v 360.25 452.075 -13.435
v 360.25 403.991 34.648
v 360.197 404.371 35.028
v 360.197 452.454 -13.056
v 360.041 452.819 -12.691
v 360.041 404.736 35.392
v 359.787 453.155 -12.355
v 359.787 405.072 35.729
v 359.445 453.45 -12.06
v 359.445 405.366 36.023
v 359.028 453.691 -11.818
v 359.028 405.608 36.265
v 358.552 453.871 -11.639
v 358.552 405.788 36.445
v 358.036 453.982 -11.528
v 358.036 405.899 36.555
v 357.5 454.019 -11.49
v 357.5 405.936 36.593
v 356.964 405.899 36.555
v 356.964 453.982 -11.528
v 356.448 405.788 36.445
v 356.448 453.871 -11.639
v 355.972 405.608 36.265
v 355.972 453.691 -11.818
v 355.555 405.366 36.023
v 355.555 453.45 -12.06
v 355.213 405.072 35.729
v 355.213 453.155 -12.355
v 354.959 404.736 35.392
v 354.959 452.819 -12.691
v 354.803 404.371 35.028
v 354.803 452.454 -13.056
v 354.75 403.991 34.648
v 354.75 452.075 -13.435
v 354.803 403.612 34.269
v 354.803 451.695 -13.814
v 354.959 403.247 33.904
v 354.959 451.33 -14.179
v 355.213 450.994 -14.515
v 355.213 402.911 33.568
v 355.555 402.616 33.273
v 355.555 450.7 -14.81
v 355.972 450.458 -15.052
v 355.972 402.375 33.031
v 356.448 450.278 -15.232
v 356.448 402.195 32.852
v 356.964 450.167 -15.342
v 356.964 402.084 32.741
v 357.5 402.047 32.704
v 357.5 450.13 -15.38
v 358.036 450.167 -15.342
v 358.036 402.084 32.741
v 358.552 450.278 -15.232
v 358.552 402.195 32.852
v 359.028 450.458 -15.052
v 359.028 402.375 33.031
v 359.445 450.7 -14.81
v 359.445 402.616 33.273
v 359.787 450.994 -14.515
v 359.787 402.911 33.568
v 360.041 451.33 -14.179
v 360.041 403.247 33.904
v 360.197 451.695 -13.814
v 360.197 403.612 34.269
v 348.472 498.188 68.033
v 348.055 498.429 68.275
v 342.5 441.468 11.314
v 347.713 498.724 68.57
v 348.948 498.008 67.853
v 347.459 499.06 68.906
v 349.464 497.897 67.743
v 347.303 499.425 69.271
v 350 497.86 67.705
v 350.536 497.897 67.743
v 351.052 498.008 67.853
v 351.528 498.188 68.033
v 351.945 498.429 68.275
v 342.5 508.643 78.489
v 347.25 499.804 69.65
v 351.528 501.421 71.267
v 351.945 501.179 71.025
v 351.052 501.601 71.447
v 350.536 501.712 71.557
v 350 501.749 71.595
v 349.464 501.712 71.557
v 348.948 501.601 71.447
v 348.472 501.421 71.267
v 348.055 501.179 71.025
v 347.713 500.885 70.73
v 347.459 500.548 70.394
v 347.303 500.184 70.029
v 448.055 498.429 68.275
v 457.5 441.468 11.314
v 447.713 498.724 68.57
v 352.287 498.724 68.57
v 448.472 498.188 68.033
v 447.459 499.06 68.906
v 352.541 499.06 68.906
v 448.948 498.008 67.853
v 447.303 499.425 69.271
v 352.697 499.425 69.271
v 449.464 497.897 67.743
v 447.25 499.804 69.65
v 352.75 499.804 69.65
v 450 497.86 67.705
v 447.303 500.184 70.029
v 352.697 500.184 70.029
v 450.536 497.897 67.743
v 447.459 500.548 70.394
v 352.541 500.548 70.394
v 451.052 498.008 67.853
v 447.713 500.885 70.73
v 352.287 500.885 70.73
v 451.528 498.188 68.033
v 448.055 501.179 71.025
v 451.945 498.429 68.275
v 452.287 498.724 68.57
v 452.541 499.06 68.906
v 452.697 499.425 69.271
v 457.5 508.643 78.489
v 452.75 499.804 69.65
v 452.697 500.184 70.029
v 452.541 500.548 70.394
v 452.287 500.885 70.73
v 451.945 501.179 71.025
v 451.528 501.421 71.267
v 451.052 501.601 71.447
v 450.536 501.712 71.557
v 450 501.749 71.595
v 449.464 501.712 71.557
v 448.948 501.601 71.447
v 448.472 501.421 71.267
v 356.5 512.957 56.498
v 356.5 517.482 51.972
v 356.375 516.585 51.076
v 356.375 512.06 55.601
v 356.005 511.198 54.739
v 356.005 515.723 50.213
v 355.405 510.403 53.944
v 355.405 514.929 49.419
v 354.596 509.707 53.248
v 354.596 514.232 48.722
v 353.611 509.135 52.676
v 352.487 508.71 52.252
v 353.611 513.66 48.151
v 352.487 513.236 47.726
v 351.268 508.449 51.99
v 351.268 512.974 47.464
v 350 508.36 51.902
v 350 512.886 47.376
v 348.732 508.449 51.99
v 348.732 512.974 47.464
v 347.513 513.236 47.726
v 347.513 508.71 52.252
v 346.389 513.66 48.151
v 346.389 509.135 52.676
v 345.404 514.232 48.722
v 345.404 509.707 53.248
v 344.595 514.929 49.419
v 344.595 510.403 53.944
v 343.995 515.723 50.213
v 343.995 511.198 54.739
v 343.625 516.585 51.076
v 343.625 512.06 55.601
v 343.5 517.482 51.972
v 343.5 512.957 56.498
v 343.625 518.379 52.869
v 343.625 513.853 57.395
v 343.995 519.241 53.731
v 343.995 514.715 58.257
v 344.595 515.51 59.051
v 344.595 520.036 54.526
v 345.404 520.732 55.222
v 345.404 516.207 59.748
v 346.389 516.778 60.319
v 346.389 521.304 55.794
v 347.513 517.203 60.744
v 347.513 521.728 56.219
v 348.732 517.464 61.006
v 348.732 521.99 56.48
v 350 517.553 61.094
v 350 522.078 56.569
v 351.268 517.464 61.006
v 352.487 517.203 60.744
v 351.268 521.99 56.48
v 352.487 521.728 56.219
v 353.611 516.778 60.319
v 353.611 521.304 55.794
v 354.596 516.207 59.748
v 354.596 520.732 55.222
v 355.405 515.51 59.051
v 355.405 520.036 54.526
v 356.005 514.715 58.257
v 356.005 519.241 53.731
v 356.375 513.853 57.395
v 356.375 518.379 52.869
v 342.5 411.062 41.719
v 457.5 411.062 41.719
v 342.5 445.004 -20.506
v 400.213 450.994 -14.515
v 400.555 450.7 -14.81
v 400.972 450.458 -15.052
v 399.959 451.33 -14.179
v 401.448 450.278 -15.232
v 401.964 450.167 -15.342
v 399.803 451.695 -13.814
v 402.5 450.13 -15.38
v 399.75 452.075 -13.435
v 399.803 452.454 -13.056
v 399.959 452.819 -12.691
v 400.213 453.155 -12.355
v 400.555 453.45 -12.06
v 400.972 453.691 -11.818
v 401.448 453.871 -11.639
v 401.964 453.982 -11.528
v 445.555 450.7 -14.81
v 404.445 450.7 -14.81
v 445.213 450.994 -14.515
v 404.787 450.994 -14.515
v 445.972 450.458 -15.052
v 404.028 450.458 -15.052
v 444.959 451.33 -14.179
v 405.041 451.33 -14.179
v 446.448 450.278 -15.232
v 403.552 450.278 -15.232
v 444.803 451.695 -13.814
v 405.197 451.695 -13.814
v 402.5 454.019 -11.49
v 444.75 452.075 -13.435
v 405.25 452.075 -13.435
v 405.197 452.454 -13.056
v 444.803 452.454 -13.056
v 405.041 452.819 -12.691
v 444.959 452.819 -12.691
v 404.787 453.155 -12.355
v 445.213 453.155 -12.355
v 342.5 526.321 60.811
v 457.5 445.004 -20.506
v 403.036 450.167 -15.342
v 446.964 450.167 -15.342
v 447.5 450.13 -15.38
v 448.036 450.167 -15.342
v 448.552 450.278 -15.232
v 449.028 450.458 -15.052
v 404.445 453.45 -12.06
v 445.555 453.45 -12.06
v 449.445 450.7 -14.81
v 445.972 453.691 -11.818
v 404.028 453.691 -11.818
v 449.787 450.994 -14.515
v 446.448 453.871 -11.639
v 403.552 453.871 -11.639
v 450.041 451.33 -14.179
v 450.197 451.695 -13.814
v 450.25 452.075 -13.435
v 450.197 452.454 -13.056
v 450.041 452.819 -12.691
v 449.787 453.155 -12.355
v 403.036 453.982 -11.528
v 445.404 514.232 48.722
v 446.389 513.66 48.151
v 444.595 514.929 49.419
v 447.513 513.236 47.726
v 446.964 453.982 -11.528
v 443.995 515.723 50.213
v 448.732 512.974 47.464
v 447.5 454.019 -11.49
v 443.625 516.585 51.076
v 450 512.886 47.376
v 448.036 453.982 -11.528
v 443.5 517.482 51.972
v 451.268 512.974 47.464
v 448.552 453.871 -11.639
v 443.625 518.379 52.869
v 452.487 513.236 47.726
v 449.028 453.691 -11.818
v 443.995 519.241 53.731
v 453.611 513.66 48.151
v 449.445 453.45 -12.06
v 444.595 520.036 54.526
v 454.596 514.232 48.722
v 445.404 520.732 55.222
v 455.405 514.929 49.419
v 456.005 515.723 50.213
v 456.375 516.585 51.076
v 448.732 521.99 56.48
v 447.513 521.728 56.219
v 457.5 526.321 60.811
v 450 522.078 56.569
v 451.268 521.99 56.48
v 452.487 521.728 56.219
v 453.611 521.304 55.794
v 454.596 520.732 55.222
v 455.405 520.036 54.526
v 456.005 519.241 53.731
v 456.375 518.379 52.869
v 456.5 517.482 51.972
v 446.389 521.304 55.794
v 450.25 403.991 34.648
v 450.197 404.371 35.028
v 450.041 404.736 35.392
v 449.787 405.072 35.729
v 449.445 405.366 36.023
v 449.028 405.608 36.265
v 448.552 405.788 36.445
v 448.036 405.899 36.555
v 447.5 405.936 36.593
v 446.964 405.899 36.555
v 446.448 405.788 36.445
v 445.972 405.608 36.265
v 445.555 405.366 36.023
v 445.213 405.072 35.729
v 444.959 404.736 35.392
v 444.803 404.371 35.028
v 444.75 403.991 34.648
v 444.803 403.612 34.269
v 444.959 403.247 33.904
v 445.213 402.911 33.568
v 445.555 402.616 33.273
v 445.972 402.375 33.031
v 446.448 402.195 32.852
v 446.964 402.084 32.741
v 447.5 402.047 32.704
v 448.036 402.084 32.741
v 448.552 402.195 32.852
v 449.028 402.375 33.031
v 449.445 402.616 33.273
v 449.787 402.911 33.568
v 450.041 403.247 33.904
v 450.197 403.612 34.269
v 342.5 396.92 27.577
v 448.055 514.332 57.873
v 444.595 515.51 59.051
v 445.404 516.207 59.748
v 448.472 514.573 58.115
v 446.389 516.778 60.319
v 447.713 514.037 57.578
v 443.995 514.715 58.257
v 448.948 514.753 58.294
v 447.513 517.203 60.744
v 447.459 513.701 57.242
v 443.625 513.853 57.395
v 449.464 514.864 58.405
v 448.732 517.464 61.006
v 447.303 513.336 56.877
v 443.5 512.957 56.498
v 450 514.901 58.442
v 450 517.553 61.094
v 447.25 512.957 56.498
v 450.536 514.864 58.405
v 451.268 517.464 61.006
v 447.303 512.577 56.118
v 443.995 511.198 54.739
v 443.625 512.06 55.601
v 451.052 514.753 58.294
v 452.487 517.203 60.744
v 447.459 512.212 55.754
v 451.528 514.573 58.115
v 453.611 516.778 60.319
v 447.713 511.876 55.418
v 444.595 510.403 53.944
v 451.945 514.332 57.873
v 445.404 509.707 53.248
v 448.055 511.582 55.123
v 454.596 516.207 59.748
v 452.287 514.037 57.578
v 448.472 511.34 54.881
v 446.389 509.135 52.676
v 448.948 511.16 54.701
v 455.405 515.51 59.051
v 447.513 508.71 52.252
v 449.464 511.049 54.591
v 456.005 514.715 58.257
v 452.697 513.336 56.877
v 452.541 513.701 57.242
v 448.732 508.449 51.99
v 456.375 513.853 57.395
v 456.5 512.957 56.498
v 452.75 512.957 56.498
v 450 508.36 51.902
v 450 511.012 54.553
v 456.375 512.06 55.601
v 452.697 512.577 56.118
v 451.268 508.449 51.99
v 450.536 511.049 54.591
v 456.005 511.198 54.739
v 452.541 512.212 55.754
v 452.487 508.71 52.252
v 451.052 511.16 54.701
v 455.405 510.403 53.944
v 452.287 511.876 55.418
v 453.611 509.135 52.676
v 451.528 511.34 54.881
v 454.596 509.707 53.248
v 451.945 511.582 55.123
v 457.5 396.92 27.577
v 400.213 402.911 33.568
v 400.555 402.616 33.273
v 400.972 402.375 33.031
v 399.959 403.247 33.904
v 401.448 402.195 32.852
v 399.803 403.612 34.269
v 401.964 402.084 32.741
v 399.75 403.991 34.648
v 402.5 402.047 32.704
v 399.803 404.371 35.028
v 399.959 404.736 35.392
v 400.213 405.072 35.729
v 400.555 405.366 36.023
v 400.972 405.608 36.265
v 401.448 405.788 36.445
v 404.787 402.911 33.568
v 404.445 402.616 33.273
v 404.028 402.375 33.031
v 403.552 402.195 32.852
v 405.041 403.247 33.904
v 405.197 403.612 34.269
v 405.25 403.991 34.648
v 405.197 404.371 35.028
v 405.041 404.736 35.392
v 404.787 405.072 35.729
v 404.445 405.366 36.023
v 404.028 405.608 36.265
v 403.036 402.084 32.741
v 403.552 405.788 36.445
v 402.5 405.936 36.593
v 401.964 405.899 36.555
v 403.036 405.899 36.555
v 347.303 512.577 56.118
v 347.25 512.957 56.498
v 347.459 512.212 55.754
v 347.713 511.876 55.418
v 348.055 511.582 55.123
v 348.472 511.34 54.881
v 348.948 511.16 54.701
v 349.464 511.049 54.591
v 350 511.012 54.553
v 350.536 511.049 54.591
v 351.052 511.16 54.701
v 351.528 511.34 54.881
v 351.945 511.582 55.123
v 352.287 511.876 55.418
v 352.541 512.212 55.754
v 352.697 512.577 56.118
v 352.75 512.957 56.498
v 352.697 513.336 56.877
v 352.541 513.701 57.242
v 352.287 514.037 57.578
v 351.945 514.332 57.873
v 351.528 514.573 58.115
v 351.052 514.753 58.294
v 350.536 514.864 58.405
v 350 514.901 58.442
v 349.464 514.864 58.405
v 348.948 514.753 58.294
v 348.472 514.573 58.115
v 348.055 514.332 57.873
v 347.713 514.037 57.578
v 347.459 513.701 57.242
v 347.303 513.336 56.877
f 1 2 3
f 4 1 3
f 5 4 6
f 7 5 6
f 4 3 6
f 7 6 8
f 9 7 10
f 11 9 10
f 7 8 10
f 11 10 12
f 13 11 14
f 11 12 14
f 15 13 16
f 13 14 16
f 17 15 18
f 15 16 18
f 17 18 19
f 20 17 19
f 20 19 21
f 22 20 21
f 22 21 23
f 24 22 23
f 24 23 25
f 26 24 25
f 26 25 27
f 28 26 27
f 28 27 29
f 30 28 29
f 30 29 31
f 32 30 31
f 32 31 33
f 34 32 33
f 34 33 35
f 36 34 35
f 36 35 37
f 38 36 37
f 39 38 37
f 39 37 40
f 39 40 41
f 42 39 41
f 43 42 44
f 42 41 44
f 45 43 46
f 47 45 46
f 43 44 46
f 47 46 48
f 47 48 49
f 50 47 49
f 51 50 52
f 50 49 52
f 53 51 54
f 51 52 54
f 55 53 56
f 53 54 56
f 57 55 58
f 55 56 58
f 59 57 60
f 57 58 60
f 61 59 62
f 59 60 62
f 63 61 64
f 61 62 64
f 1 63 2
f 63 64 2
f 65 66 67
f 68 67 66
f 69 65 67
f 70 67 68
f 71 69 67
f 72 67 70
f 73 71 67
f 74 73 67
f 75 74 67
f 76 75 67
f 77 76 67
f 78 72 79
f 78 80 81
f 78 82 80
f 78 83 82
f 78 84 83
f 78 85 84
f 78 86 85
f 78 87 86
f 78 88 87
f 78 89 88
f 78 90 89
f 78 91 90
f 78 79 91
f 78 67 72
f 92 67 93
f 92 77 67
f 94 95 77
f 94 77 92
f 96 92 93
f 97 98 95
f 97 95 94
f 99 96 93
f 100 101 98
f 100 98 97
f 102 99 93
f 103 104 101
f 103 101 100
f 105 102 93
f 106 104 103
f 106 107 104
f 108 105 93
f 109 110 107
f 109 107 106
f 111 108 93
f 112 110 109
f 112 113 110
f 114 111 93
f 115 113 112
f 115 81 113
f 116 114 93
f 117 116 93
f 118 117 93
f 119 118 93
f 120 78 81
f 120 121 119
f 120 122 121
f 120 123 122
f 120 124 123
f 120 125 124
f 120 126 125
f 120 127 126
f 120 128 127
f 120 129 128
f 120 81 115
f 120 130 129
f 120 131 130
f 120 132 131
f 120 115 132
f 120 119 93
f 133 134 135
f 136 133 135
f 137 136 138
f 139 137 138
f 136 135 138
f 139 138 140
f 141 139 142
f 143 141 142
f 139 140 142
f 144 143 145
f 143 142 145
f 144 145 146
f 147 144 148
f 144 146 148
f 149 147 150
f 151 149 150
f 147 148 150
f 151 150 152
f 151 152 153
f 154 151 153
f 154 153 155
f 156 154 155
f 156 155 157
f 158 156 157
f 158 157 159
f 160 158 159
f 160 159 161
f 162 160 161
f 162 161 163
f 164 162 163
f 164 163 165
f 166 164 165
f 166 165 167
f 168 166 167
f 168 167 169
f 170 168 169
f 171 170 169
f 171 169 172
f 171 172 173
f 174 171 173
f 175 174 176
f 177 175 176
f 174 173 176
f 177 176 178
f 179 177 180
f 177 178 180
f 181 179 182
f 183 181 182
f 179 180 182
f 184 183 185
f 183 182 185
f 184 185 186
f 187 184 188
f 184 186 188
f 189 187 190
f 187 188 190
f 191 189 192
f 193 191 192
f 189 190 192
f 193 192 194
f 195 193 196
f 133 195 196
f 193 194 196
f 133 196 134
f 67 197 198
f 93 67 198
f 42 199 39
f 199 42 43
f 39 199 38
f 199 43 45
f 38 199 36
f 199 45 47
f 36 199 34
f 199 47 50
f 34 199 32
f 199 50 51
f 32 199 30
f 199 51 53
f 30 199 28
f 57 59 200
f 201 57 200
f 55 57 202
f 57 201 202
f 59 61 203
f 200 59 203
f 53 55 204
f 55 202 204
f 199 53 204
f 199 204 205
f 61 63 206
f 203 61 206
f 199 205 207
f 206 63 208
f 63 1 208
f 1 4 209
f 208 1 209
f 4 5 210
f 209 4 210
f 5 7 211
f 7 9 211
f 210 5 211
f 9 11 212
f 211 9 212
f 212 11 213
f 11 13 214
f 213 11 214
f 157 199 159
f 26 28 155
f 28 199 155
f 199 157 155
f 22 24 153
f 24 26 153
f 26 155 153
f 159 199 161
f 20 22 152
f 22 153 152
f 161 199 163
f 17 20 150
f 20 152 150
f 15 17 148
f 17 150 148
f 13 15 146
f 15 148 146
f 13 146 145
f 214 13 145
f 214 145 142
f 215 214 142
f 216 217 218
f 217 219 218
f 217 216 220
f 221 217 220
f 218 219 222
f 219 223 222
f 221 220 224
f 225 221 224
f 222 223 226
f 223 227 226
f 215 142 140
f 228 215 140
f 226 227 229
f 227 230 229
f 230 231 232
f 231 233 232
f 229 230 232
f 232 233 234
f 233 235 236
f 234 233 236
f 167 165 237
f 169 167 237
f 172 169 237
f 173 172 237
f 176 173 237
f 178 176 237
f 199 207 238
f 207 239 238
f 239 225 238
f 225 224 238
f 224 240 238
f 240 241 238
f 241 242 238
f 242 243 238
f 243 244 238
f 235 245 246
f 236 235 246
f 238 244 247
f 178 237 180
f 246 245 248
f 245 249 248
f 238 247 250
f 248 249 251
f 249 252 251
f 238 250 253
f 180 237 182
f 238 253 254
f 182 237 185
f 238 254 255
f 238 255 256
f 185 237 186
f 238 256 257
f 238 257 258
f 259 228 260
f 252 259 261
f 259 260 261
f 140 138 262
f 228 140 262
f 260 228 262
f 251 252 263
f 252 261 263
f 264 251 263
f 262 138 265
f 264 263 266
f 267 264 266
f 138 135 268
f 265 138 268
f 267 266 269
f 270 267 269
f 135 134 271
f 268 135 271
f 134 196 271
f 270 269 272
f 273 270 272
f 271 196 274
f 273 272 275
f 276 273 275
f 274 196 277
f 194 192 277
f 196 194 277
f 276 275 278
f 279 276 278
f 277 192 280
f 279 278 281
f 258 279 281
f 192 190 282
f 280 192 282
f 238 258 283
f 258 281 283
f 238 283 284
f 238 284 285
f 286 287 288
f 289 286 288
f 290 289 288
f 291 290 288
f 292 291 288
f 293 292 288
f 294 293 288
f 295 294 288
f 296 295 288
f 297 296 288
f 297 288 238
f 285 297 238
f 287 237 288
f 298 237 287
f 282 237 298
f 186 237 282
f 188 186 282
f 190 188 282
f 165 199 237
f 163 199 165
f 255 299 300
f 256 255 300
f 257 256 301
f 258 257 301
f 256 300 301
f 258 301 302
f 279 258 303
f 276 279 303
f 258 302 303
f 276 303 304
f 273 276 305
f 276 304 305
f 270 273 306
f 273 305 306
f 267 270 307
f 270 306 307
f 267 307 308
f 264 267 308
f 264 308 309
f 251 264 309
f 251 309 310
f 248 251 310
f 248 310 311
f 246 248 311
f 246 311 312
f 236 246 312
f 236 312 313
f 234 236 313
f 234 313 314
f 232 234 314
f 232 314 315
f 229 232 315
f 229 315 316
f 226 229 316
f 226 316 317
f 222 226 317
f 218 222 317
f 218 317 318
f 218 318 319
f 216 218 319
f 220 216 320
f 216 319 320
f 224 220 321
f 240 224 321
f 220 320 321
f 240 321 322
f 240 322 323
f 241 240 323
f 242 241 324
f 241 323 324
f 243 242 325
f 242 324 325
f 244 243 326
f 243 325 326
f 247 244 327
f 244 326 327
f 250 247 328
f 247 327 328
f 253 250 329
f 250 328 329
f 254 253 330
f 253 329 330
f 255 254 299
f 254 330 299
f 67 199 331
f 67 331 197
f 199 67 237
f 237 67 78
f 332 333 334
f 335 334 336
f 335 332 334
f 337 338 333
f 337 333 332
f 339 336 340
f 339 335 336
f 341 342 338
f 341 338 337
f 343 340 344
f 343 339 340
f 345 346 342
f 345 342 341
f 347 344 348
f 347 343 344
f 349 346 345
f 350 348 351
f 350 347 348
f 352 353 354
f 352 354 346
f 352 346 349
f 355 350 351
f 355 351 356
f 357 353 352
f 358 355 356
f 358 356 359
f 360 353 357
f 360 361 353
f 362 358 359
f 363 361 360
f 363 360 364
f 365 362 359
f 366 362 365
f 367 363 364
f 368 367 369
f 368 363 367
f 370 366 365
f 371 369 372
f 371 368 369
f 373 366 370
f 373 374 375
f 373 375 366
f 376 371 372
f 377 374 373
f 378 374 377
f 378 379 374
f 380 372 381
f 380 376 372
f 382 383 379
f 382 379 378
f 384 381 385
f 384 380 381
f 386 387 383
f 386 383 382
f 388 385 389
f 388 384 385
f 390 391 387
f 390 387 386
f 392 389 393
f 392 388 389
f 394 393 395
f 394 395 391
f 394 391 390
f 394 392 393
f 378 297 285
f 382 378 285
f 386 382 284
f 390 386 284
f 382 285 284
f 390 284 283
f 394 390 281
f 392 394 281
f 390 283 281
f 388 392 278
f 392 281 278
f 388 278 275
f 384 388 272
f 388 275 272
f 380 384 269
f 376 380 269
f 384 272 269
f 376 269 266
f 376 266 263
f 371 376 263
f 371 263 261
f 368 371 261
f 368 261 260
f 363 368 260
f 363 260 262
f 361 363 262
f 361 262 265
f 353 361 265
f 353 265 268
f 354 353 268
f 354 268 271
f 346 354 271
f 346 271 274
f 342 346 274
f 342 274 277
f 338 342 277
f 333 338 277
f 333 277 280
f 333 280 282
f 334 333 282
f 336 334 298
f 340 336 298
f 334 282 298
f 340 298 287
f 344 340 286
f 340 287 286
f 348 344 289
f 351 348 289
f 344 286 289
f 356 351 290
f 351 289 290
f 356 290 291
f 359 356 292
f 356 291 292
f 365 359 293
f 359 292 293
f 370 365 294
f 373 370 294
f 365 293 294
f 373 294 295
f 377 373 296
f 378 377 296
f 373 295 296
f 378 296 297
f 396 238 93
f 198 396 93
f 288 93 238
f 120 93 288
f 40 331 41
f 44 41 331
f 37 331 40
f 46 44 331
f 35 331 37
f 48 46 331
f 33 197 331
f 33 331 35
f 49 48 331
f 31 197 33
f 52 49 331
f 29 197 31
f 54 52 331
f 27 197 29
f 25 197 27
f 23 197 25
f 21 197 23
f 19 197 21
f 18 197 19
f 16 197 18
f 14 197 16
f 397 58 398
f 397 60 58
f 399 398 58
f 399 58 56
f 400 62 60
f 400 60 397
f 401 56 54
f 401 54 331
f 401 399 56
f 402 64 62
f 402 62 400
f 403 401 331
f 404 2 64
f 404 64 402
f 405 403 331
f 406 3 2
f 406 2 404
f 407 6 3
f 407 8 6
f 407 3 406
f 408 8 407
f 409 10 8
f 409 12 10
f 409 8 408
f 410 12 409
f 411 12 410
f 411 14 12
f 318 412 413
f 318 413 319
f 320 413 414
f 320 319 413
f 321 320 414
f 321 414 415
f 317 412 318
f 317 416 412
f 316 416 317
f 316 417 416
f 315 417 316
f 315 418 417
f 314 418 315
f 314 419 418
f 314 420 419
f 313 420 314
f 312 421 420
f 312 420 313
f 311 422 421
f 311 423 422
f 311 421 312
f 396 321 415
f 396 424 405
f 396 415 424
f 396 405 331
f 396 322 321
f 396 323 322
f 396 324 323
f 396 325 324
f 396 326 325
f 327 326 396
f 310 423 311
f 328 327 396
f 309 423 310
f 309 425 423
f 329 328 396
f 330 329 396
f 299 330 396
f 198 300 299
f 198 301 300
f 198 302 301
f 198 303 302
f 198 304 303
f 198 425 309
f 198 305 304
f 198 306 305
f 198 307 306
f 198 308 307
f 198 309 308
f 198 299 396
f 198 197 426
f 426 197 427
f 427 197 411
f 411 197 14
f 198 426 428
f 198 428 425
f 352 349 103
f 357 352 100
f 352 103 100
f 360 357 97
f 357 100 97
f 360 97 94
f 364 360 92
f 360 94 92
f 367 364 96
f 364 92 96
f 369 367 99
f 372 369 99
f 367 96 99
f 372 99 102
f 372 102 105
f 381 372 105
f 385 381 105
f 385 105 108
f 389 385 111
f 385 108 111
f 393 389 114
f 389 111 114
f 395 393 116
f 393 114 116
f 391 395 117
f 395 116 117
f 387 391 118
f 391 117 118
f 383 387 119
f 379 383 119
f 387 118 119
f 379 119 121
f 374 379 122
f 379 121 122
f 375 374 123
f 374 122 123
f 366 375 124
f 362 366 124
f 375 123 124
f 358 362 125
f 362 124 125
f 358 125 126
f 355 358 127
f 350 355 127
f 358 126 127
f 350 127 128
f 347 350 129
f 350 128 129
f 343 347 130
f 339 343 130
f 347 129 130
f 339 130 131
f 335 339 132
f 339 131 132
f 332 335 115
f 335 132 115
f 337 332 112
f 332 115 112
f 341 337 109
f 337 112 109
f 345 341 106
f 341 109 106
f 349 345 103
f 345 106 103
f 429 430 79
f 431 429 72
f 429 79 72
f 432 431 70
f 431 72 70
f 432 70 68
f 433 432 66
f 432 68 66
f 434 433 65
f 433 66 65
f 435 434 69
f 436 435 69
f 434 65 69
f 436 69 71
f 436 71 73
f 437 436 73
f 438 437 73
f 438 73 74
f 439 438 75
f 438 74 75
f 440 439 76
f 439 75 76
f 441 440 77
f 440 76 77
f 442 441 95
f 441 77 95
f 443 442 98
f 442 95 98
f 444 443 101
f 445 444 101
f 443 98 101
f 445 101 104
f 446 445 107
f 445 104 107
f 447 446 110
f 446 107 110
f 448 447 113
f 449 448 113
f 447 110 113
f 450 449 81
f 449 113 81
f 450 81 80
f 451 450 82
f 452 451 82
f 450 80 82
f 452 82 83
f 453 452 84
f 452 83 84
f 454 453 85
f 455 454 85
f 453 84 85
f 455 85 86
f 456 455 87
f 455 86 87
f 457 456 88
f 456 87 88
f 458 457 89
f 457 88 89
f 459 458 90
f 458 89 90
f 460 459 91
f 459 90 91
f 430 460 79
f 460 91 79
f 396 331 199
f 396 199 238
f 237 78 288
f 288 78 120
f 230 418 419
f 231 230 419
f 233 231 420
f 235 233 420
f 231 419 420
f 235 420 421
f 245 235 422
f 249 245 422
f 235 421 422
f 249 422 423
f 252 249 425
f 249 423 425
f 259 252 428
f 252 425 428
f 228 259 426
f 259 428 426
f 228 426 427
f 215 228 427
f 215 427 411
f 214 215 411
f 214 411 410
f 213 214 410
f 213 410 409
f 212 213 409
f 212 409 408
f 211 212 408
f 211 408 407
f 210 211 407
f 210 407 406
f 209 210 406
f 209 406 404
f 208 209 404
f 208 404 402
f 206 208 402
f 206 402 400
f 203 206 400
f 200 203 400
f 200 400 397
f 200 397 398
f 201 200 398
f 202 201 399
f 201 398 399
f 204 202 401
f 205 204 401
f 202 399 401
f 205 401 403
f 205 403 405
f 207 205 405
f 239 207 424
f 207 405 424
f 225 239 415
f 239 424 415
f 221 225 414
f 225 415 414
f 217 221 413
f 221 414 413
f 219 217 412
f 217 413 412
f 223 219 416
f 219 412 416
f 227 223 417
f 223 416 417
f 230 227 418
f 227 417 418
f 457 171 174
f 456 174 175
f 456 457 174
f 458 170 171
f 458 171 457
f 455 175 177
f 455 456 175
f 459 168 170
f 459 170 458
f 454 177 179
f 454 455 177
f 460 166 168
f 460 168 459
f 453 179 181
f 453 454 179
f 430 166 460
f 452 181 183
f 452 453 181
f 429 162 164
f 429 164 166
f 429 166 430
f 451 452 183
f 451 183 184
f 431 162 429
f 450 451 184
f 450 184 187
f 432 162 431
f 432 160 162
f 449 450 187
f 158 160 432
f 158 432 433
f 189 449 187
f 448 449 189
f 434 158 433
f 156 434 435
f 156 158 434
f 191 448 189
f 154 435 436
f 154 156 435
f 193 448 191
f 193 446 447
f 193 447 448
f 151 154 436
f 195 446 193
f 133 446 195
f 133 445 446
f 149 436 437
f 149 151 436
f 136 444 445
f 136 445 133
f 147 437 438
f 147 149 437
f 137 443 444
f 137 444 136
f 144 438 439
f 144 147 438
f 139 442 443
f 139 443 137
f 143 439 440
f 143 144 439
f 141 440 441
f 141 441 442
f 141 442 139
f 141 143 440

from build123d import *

# Parameters (mm, degrees)
SKETCH035_W             = 115
SKETCH035_H             = 110
PAD002_DEPTH            = 25
SKETCH036_W             = 115
SKETCH036_H             = 20
PAD003_DEPTH            = 68
SKETCH037_R             = 2.75
HOLE001_DEPTH           = 68.001
HOLE004_D               = 5.5
HOLE004_CBORE_D         = 13
HOLE004_CBORE_DEPTH     = 6.4
BODY008_PLACEMENT_ANGLE = 45


with BuildPart() as part:
    # Sketch035 → Pad002 (new body)
    with BuildSketch(Plane.XY.offset(-39)):
        with Locations((217.5, 35)):
            Rectangle(SKETCH035_W, SKETCH035_H)
    extrude(amount=-PAD002_DEPTH)

    # Sketch036 → Pad003 (join)
    with BuildSketch(Plane.XY.offset(4)):
        with Locations((217.5, -15)):
            Rectangle(SKETCH036_W, SKETCH036_H)
    extrude(amount=-PAD003_DEPTH)

    # Sketch037 → Hole001 (cut, through all)
    with BuildSketch(Plane.XY.offset(4)):
        with Locations((175, -15)):
            Circle(SKETCH037_R)
        with Locations((265, -15)):
            Circle(SKETCH037_R)
        with Locations((220, -15)):
            Circle(SKETCH037_R)
    extrude(amount=-HOLE001_DEPTH, mode=Mode.SUBTRACT)

    # Hole004 (through all)
    with Locations(Plane(origin=(0, 0, -64), x_dir=(1, 0, 0), z_dir=(0, 0, -1))):
        with Locations((167.5, -77.5), (267.5, -77.5)):
            CounterBoreHole(HOLE004_D / 2, HOLE004_CBORE_D / 2, HOLE004_CBORE_DEPTH)


with BuildPart() as part_1:
    # Body008 placement: moved
    add(part.part.moved(Location((182.5, 417.426407, 42.426407))).rotate(Axis((182.5, 417.426407, 42.426407), (1, 0, 0)), BODY008_PLACEMENT_ANGLE))


solid = part_1.part
